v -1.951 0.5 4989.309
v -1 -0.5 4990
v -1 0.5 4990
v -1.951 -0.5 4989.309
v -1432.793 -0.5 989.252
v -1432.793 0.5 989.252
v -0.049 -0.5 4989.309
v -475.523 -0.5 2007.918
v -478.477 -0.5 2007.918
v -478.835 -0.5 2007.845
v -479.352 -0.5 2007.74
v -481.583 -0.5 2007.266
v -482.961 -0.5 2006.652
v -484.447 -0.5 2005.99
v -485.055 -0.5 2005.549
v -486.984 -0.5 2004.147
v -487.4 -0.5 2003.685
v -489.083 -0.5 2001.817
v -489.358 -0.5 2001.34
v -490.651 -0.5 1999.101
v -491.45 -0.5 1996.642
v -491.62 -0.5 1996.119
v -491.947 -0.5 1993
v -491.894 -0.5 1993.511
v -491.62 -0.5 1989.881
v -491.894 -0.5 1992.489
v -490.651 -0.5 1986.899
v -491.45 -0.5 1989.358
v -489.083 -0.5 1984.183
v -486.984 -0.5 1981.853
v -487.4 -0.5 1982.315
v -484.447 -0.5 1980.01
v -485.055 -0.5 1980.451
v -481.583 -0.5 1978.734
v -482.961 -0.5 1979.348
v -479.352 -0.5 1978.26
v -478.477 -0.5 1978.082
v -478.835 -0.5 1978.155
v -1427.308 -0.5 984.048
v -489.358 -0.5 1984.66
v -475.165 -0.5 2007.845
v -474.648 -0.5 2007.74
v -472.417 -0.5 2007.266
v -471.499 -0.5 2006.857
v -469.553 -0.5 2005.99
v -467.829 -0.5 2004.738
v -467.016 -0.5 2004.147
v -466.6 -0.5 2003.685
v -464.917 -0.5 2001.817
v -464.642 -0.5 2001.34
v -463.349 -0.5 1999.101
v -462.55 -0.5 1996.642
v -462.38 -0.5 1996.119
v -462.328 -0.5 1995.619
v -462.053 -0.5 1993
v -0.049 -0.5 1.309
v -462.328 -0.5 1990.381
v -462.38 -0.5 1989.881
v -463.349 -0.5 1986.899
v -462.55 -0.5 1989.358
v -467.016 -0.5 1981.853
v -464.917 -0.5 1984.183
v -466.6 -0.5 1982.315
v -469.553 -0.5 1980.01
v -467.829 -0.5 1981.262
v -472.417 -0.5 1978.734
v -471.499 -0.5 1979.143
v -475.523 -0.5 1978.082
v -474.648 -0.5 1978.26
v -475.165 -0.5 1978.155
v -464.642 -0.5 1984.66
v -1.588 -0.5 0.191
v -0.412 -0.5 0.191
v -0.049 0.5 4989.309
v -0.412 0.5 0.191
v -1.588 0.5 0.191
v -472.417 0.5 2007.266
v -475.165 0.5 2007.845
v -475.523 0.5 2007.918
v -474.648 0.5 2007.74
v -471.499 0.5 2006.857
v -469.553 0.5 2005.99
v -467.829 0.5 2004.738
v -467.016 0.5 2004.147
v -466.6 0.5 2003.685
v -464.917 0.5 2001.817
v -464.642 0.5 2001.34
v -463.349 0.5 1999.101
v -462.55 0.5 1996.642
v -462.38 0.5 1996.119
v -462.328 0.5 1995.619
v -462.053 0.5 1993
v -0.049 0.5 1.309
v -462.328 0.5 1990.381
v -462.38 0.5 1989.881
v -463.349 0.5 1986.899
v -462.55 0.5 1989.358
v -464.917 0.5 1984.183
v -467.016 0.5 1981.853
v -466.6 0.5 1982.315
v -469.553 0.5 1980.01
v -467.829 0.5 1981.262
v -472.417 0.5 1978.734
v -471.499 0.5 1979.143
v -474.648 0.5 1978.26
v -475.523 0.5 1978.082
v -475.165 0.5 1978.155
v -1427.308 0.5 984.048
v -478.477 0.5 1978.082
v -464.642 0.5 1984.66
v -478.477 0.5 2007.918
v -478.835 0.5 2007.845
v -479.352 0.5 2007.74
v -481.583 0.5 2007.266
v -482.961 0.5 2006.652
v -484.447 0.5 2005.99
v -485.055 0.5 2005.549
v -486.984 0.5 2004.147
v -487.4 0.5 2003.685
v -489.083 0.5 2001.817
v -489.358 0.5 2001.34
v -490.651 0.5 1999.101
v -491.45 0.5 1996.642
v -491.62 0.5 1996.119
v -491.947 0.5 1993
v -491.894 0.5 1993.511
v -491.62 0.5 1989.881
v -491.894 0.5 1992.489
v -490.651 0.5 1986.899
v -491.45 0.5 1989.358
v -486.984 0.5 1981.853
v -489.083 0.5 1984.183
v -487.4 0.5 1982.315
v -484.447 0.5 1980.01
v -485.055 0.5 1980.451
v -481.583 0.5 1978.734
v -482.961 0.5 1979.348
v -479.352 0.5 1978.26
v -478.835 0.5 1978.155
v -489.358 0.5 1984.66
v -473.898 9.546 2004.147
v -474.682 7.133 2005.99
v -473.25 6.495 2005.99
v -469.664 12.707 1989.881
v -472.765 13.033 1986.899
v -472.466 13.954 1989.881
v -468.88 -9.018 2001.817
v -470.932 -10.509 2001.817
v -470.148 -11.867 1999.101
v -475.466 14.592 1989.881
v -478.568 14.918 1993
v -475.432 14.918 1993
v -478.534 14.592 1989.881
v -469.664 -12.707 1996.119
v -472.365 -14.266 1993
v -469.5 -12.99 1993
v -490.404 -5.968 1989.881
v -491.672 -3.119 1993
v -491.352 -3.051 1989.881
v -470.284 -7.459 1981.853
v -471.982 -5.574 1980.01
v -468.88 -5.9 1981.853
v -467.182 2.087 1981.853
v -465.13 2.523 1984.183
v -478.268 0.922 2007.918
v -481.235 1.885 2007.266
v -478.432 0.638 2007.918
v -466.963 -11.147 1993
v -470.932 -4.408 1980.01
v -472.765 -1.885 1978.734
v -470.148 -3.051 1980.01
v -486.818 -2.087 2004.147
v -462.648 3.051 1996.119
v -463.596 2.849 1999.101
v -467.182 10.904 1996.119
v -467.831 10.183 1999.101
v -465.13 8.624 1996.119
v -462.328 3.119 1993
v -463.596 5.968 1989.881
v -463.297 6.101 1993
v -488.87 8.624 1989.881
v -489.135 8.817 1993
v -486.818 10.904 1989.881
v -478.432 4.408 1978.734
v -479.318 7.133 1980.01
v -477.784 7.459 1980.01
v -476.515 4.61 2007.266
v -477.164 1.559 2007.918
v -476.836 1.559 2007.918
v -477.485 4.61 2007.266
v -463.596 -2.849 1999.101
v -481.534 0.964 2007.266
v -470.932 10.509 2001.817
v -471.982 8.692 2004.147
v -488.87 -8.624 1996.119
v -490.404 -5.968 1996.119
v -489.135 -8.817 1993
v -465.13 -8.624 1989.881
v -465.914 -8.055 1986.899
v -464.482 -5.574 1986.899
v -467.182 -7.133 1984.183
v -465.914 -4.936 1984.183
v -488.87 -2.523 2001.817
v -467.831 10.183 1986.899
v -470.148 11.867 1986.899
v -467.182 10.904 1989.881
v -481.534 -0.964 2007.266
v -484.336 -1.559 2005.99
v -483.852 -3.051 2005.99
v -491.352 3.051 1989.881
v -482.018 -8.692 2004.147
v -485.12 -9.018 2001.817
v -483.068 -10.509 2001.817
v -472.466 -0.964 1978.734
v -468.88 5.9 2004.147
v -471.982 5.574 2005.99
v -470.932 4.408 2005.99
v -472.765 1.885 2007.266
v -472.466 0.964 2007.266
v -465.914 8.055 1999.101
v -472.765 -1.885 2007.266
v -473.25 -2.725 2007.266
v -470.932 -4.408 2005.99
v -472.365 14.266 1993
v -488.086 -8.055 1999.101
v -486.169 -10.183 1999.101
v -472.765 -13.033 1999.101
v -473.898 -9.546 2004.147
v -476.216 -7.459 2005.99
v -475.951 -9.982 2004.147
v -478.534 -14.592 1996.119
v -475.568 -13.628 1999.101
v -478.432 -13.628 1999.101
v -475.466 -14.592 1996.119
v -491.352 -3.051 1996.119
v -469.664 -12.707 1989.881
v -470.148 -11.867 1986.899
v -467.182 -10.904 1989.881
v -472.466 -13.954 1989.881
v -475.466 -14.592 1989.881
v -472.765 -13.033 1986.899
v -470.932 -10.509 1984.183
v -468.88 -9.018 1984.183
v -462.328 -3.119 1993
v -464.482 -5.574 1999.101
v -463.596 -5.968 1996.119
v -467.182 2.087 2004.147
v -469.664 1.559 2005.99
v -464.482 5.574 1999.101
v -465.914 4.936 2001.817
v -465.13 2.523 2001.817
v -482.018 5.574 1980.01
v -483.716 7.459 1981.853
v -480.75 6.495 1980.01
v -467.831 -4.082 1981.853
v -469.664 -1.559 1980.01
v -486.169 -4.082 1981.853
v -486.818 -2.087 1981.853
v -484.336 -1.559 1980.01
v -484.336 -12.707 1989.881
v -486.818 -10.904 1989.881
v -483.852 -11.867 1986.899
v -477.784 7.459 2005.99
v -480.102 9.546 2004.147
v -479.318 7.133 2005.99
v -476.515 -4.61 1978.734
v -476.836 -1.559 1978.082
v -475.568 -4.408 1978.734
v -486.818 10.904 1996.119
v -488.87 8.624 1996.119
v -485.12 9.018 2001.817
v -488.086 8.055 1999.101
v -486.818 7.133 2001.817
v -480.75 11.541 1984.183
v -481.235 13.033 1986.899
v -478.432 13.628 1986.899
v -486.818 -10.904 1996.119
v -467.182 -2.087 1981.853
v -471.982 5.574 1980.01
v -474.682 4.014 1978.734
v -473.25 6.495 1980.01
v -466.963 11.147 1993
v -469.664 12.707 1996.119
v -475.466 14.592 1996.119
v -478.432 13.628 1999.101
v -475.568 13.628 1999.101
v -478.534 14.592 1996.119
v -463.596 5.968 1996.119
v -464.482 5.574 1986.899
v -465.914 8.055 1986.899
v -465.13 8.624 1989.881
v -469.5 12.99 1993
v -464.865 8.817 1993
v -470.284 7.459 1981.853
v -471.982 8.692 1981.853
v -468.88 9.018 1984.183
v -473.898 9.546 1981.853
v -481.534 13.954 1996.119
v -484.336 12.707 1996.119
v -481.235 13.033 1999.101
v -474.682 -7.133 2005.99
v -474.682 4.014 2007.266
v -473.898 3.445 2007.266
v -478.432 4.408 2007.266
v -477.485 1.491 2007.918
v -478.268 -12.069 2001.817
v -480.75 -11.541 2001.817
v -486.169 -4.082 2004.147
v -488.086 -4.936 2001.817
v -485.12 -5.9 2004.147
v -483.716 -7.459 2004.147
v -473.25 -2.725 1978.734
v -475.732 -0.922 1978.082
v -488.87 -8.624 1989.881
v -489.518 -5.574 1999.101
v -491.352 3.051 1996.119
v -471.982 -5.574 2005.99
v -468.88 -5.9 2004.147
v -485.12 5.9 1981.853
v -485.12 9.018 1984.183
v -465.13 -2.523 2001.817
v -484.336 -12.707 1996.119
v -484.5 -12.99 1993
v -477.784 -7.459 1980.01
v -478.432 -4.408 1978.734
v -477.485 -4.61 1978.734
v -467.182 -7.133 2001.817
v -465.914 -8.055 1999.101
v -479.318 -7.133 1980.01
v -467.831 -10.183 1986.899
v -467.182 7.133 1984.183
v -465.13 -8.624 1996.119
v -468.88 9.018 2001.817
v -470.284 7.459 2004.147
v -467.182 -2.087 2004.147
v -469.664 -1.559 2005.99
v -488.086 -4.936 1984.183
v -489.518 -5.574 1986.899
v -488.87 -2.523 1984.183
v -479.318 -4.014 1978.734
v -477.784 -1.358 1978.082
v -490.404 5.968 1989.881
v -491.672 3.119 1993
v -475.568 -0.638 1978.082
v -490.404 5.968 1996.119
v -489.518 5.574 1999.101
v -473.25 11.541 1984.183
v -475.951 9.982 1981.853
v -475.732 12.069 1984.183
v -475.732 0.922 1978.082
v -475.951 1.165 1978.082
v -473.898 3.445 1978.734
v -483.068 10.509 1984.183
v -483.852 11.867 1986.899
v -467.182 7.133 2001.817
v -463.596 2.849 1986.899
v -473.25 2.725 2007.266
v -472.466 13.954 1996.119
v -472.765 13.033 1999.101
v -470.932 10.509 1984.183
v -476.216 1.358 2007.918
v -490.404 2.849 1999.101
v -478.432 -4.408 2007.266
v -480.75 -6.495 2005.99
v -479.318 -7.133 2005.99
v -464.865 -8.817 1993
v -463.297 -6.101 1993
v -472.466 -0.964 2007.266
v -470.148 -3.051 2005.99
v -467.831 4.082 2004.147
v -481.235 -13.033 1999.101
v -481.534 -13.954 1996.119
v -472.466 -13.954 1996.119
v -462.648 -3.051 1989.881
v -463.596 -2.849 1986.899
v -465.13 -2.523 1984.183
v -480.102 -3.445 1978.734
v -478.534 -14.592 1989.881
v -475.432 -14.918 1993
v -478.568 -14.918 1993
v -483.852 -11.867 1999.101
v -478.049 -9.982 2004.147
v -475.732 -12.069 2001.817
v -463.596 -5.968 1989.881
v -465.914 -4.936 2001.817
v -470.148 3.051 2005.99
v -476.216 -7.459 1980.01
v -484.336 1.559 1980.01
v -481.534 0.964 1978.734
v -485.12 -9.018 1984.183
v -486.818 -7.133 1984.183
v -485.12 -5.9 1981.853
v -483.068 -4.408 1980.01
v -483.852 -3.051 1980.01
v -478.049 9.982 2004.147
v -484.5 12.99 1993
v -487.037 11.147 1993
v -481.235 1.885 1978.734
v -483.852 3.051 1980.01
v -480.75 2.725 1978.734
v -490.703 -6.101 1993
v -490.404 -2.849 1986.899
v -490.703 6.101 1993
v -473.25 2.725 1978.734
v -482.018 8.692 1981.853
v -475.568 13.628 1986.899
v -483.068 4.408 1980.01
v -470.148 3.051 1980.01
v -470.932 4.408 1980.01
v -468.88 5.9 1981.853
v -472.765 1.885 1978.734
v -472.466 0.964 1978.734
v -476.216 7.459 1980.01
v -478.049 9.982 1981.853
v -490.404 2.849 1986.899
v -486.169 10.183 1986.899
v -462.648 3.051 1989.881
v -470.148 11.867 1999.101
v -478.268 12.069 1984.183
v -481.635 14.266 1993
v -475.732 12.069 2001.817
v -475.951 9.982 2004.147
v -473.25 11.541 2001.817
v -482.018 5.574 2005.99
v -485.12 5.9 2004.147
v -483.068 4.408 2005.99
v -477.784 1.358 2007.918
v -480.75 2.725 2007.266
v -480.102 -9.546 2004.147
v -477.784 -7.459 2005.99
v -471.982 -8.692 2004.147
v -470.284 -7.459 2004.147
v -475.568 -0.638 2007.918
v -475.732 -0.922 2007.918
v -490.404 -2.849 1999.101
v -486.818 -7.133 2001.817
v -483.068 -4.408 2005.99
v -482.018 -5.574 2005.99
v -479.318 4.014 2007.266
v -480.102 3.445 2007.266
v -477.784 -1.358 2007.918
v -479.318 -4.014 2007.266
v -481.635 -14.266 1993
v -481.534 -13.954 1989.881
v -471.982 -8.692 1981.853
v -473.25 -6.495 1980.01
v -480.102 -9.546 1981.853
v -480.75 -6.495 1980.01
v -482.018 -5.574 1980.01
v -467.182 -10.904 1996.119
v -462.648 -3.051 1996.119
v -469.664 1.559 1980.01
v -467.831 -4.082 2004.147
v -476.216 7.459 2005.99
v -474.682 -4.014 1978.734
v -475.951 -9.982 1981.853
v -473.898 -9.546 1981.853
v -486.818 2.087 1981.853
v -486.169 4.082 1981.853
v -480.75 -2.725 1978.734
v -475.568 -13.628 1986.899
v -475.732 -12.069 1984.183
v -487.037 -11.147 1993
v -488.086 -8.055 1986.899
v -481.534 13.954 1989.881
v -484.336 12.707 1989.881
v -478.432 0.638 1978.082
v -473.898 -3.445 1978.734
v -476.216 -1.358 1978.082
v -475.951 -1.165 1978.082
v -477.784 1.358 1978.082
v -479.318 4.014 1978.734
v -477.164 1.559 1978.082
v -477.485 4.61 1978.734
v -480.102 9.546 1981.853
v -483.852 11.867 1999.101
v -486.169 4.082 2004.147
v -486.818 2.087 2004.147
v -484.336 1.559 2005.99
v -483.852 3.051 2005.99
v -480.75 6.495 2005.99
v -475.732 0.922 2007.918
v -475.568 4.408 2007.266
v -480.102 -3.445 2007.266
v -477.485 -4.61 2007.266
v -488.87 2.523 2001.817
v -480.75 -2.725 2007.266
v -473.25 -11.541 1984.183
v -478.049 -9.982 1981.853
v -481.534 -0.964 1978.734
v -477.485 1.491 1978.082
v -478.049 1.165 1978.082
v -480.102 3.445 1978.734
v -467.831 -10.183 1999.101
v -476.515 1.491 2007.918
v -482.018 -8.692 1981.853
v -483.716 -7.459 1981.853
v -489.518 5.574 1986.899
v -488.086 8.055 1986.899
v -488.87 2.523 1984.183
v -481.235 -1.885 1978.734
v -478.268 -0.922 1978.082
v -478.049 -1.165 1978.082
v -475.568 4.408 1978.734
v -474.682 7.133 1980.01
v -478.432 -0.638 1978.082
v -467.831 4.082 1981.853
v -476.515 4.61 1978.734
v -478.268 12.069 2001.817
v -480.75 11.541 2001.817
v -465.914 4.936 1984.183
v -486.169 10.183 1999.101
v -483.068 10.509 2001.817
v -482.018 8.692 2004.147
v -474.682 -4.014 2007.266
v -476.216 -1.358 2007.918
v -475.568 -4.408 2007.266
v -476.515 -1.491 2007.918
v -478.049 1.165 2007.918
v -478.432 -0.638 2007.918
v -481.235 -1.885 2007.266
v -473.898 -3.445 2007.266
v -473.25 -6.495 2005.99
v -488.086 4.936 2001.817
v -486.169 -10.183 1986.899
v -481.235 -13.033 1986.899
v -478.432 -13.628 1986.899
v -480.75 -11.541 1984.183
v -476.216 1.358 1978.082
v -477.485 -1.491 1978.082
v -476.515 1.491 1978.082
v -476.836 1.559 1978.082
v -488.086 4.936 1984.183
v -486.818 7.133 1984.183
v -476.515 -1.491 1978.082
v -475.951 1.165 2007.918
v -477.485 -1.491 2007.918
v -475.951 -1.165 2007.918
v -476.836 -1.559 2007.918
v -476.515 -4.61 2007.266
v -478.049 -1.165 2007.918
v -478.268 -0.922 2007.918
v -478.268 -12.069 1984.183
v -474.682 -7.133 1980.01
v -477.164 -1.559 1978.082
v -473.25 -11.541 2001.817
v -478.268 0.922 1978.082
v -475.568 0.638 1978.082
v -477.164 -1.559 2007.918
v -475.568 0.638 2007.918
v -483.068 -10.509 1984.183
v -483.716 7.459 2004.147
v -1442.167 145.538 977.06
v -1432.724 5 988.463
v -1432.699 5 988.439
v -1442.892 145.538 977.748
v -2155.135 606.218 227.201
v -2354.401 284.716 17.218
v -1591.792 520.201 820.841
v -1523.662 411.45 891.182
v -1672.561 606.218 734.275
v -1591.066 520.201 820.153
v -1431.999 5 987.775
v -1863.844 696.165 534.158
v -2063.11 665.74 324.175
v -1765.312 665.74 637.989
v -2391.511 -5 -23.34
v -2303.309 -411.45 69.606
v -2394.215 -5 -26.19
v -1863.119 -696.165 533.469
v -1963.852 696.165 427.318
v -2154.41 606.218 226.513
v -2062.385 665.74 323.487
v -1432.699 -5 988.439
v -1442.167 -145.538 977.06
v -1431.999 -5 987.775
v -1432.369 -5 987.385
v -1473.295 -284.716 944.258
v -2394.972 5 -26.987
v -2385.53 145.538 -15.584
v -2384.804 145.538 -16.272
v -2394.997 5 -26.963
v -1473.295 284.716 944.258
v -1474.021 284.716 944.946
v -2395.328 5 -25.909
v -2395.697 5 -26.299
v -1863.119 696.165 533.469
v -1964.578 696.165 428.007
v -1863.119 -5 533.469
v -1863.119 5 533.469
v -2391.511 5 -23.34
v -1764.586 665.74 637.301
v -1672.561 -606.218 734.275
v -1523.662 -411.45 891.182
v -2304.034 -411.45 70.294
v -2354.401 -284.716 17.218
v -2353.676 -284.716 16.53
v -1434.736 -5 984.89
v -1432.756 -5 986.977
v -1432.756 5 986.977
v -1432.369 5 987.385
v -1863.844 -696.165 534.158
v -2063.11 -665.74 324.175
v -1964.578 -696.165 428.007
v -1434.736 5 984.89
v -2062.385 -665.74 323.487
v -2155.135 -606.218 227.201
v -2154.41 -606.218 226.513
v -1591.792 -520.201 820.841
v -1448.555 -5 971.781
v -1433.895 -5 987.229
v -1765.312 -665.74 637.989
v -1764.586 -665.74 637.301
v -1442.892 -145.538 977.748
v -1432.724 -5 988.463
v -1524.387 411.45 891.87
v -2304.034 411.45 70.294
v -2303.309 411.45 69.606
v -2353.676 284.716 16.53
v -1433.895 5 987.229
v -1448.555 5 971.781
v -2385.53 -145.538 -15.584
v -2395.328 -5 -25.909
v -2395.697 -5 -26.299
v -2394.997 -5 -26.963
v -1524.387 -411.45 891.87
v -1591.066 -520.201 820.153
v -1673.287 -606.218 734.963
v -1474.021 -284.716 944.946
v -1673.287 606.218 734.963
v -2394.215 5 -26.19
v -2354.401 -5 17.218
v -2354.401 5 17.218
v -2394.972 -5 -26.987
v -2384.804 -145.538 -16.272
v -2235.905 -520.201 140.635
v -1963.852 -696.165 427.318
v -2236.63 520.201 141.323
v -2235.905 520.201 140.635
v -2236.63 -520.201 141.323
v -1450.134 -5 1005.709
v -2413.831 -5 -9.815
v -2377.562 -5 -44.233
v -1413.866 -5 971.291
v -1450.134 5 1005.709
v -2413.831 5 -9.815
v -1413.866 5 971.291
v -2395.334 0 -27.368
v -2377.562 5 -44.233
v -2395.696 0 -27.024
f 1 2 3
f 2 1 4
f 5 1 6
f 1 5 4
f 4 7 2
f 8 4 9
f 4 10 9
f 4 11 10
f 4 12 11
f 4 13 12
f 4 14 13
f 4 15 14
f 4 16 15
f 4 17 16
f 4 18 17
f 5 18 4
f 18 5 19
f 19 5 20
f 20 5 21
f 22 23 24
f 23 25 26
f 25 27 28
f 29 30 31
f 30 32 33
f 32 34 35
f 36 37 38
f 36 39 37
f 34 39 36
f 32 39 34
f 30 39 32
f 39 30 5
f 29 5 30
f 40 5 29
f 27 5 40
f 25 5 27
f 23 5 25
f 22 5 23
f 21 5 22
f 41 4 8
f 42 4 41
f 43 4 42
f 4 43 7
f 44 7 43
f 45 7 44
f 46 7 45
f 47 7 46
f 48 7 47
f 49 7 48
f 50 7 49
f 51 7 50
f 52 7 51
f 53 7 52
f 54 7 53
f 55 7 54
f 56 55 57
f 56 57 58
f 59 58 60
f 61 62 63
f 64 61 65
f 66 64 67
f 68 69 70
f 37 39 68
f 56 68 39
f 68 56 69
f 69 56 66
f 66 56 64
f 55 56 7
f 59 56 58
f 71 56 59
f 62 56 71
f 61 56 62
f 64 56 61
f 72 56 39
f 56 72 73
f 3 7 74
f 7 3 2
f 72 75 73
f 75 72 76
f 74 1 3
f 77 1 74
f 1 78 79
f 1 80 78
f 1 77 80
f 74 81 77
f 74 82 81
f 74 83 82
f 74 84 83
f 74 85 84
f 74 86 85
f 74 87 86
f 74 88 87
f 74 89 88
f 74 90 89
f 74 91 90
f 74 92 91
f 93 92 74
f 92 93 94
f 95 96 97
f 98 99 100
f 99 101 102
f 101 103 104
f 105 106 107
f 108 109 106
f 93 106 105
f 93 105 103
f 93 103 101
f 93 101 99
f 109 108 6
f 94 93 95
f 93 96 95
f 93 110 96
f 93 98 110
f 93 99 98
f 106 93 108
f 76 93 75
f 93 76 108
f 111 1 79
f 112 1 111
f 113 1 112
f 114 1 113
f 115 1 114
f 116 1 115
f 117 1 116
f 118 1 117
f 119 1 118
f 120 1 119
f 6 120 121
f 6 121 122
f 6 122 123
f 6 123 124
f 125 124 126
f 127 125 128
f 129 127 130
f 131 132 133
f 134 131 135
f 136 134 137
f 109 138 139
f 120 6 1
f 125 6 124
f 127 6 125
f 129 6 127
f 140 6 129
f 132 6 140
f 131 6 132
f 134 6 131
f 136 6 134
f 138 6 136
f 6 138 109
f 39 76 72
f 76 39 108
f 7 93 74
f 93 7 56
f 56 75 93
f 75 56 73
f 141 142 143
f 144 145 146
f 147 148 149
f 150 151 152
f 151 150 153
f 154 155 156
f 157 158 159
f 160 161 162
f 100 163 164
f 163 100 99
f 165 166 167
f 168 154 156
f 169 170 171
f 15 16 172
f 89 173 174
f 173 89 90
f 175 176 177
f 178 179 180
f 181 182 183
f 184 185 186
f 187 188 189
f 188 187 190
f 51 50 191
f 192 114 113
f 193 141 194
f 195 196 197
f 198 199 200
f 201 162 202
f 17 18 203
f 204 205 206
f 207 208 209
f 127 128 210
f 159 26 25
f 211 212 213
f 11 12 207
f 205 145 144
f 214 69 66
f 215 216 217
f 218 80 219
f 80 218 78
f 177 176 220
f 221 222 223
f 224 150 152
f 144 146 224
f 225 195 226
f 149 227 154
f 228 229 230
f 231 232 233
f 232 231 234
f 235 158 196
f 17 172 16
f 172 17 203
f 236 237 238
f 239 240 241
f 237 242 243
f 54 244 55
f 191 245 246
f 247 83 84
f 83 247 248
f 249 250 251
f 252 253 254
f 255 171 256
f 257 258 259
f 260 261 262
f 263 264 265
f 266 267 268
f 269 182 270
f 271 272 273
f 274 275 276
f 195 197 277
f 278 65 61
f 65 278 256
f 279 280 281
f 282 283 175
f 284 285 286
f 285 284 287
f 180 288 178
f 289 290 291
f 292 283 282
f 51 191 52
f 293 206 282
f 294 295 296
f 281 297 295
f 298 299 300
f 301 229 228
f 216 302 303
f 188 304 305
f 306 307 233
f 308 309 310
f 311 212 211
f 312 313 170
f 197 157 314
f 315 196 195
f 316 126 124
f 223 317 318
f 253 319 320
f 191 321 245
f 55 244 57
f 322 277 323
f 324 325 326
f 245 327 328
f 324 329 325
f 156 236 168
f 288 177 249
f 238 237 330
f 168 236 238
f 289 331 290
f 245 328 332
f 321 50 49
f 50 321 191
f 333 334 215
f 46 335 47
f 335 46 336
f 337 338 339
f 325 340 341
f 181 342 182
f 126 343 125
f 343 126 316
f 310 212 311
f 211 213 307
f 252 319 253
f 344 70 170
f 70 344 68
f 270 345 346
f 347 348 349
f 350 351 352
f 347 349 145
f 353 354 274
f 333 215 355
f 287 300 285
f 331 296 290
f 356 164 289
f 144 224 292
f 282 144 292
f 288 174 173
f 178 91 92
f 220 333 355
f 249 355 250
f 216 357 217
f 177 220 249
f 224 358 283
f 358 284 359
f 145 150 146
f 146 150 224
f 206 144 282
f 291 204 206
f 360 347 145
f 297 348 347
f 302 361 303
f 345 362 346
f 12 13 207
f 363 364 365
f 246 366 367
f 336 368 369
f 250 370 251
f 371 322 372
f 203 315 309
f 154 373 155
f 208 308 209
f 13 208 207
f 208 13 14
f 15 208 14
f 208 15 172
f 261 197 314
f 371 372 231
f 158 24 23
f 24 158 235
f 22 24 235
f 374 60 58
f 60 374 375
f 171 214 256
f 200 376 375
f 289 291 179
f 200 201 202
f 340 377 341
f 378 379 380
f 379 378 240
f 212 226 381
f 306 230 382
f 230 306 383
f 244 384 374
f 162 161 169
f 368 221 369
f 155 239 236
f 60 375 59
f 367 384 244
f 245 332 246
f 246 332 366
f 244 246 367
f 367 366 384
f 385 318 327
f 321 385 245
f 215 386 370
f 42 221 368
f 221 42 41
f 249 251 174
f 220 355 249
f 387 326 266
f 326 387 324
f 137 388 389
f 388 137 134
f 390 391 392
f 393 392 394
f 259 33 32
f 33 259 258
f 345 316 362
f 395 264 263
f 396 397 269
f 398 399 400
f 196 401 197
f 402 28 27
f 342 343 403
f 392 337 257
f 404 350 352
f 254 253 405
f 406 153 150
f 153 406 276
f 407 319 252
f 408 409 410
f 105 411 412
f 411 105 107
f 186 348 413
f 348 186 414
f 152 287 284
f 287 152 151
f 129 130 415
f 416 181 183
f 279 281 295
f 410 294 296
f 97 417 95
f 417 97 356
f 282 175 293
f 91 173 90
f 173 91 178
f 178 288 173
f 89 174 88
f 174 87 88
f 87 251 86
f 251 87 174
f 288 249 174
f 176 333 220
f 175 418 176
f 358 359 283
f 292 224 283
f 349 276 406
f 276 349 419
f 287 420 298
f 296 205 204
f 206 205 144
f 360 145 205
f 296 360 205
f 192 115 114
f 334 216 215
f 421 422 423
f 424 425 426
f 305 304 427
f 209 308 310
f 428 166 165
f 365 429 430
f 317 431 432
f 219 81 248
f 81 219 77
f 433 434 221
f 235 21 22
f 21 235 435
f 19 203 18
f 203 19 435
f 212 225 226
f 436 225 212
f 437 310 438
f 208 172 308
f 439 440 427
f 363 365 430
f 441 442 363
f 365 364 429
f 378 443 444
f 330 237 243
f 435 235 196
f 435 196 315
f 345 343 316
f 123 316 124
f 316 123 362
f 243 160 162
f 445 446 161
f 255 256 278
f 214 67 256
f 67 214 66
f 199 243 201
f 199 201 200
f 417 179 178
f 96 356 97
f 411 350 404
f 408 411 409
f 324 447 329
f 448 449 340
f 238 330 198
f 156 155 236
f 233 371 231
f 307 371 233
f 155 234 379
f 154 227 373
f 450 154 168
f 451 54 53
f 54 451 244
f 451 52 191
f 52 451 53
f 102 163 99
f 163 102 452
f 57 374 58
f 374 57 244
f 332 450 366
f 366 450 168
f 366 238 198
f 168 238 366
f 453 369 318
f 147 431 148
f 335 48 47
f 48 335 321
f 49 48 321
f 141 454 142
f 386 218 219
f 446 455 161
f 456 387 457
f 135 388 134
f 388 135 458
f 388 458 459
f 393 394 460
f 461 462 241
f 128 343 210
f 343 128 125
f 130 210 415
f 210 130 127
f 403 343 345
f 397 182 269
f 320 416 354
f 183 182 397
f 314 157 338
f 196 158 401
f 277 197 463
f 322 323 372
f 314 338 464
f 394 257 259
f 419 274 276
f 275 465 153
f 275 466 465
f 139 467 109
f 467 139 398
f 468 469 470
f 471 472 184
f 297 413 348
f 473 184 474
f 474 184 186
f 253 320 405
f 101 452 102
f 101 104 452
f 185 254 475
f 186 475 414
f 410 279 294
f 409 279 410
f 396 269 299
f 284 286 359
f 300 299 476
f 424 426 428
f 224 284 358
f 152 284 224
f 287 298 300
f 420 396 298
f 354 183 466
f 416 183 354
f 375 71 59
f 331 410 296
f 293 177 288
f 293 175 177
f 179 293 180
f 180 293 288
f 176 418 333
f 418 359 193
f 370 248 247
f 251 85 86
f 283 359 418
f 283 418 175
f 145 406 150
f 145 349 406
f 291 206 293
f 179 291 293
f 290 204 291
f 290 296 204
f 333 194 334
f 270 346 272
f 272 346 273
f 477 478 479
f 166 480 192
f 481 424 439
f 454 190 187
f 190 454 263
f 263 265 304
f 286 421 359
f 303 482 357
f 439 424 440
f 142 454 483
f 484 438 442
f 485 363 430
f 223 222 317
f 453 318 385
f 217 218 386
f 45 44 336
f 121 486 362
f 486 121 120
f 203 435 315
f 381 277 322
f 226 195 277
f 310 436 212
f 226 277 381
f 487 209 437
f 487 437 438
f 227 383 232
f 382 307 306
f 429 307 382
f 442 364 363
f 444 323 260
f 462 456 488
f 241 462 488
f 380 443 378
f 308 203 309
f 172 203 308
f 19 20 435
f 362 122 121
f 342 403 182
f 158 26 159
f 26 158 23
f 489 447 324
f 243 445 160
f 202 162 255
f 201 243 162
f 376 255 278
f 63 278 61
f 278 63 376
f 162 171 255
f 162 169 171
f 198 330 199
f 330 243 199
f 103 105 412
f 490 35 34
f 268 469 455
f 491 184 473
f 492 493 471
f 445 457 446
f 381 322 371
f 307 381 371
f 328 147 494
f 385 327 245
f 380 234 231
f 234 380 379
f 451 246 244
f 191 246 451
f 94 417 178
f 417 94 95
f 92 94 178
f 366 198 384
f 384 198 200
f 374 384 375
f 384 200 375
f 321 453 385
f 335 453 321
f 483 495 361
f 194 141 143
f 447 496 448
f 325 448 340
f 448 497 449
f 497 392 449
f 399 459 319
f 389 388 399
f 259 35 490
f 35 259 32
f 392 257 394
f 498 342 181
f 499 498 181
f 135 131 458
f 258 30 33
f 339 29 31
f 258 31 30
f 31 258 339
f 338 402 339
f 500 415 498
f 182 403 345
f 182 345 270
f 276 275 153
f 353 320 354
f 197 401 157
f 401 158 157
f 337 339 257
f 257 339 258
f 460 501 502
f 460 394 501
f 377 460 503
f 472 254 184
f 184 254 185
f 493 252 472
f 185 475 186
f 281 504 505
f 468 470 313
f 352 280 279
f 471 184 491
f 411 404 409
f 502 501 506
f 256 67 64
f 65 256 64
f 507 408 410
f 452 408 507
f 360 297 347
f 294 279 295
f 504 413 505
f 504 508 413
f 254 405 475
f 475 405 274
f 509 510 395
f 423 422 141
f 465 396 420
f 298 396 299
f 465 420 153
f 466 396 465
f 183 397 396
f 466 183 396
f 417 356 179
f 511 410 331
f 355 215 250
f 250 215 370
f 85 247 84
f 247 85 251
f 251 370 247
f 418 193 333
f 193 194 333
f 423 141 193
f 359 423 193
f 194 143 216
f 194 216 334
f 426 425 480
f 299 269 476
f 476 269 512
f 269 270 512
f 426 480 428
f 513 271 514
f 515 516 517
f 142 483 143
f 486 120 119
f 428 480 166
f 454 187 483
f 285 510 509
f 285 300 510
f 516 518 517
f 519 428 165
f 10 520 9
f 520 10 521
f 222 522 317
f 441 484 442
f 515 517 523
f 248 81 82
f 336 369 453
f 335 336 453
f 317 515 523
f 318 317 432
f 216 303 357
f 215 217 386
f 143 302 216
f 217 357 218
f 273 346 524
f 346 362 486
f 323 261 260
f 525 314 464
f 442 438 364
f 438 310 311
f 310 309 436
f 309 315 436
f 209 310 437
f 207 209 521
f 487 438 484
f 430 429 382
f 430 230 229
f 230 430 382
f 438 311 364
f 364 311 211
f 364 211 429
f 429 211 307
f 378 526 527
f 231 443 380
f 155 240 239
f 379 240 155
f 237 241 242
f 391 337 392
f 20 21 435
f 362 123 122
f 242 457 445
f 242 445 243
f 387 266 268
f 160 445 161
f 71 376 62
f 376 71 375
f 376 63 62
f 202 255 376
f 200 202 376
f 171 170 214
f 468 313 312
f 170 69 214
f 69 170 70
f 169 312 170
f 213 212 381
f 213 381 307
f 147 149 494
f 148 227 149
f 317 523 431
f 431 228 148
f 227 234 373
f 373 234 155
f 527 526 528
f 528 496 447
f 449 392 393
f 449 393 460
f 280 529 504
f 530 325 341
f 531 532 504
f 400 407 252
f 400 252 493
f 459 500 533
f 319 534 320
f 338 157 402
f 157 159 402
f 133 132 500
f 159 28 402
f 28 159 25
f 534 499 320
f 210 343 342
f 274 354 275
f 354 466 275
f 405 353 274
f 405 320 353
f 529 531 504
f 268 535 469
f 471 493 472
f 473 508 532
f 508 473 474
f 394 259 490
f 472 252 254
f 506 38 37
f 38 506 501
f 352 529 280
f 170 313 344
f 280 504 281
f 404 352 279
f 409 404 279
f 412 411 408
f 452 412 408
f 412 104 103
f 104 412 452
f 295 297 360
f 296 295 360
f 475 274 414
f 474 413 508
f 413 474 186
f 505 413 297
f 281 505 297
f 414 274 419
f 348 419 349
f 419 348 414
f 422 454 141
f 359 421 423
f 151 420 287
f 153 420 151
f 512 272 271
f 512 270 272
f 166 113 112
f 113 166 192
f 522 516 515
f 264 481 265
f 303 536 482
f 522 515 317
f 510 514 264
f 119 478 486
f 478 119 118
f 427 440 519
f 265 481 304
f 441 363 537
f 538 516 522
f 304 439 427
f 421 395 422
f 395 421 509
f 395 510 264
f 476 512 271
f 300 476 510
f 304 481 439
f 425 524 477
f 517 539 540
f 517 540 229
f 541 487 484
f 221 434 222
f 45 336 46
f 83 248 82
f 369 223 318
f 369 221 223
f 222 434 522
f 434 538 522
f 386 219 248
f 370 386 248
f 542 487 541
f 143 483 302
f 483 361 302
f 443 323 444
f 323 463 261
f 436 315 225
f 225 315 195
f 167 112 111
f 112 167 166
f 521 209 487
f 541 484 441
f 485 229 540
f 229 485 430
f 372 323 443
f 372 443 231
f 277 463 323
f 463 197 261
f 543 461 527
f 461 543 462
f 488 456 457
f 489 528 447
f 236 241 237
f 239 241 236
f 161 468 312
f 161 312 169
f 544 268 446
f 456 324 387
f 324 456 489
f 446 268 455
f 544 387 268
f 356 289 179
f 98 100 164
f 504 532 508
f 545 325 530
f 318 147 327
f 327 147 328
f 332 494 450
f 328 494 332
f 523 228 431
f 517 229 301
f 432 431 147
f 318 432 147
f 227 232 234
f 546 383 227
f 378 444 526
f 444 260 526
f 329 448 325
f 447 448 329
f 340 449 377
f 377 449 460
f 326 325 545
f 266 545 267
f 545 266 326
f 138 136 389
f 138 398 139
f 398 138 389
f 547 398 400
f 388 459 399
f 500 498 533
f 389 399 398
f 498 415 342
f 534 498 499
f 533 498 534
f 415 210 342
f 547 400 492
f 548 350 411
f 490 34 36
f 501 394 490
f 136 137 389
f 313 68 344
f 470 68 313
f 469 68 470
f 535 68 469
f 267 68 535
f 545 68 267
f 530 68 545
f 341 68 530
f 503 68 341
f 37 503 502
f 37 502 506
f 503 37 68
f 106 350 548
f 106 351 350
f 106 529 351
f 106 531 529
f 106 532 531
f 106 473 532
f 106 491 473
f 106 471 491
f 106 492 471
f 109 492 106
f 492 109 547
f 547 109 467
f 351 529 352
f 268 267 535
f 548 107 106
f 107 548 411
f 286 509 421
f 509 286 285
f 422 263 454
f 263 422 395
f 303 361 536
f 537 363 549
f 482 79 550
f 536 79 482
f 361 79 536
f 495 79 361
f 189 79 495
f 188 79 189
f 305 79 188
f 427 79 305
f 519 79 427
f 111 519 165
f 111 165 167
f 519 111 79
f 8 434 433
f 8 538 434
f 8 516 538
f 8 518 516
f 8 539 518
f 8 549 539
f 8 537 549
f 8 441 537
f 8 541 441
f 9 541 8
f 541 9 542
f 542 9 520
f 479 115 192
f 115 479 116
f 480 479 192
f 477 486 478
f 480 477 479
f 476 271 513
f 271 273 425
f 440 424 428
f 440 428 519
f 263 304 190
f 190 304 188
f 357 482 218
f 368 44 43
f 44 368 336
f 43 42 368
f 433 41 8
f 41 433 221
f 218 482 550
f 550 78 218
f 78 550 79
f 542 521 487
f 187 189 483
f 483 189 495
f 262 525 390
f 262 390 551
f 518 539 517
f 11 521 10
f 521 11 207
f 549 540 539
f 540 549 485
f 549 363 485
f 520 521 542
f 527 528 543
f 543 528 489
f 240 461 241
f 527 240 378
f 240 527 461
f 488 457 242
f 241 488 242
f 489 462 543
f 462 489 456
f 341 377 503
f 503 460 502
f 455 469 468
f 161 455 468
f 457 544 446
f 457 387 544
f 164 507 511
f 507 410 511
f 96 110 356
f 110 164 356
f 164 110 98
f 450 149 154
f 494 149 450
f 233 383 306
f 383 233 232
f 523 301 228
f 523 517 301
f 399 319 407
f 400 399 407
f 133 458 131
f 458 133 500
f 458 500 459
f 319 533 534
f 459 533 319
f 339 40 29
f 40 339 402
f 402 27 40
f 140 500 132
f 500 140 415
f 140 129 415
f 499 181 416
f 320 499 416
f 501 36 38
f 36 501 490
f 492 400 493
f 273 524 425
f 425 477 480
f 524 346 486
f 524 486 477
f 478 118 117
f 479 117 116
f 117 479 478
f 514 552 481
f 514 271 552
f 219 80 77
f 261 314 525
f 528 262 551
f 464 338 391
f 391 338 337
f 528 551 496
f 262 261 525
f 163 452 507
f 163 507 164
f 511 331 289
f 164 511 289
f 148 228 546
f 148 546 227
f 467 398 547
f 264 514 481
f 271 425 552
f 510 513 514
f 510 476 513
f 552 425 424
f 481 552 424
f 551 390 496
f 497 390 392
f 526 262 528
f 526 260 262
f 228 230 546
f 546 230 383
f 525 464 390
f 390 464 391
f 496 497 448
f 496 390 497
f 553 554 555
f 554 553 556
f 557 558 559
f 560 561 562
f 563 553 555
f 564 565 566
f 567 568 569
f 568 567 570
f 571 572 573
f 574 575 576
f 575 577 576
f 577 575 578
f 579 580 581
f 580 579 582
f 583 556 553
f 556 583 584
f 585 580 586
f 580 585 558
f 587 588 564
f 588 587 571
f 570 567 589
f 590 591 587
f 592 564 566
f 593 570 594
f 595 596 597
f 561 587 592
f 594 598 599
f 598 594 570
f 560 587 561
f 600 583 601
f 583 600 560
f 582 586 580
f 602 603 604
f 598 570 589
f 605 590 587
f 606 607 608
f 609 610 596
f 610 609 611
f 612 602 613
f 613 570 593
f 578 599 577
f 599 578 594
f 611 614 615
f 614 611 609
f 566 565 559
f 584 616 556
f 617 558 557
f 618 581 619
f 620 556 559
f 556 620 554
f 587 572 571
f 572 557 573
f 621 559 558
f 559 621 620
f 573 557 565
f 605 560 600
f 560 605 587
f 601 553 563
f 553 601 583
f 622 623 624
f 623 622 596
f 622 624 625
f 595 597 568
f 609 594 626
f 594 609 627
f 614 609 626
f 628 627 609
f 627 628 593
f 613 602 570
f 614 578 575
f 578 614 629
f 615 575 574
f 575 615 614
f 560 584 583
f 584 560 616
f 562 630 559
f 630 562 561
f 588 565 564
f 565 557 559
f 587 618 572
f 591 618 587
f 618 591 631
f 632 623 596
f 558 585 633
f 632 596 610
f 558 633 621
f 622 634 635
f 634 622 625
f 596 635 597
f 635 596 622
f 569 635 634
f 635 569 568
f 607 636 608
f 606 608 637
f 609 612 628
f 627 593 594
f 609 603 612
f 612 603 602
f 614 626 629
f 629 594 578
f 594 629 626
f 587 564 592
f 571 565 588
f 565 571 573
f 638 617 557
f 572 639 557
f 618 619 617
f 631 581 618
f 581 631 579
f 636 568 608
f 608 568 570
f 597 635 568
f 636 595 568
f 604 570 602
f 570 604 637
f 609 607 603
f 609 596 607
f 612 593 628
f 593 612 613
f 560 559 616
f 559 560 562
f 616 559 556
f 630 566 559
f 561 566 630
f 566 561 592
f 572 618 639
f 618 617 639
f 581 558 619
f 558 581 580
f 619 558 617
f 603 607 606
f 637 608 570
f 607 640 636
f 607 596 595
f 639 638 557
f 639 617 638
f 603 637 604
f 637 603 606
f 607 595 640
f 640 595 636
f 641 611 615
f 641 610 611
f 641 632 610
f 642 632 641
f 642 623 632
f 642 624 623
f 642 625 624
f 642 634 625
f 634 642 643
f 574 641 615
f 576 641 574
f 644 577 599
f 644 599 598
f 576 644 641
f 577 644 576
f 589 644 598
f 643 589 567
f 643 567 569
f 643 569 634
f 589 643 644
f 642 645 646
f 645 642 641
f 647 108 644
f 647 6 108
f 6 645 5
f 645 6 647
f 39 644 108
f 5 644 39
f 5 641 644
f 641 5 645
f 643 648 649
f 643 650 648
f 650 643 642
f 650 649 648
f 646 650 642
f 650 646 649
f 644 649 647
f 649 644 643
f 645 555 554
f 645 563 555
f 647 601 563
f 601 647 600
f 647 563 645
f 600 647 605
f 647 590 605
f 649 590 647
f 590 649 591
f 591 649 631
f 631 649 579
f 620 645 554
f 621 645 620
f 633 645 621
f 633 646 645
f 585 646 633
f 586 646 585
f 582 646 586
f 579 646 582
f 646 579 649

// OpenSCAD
Staksel();

module Staksel (){

  r1 = 1;
  wid = 1;

    translate([ 0 , 0 , 4990 ]) {

      rotate([ 0 , -90 , 0 ])
      hull()  { 
  
          translate([ - 1 , 0 , 1 ]) 
          rotate([ 90 , 0 , 0 ])
          cylinder( r = r1 , h = wid , center = true );
  
          translate([  - 4989 , 0 , 1 ]) 
          rotate([ 90 , 0 , 0 ])
          cylinder( r = r1 , h = wid , center = true );
  
          translate([ - 4001.5 , 0 , 1432 ]) 
          rotate([ 90 , 0 , 0 ])
          cylinder( r = r1 , h = wid , center = true );
  
      }
  
      translate([ -477 , 0 , -2997 ])
      sphere(d = 30);
      
  
      translate([ -1432 , 0 , -4001.5 ])
      rotate([ 0 , -46.5 , 0 ])
      translate([ -700 , 0 , 0 ])
      cylinder( r = 700 , h = 1 , center=true );
  
  
      
      translate([ -1432 , 0 , -4001.5 ])
      rotate([ 0 , -46.5 , 0 ])
      translate([ -700 , 0 , 0 ])
      cube([ 1400 , 10 , 50 ] , center=true );

    }



}
